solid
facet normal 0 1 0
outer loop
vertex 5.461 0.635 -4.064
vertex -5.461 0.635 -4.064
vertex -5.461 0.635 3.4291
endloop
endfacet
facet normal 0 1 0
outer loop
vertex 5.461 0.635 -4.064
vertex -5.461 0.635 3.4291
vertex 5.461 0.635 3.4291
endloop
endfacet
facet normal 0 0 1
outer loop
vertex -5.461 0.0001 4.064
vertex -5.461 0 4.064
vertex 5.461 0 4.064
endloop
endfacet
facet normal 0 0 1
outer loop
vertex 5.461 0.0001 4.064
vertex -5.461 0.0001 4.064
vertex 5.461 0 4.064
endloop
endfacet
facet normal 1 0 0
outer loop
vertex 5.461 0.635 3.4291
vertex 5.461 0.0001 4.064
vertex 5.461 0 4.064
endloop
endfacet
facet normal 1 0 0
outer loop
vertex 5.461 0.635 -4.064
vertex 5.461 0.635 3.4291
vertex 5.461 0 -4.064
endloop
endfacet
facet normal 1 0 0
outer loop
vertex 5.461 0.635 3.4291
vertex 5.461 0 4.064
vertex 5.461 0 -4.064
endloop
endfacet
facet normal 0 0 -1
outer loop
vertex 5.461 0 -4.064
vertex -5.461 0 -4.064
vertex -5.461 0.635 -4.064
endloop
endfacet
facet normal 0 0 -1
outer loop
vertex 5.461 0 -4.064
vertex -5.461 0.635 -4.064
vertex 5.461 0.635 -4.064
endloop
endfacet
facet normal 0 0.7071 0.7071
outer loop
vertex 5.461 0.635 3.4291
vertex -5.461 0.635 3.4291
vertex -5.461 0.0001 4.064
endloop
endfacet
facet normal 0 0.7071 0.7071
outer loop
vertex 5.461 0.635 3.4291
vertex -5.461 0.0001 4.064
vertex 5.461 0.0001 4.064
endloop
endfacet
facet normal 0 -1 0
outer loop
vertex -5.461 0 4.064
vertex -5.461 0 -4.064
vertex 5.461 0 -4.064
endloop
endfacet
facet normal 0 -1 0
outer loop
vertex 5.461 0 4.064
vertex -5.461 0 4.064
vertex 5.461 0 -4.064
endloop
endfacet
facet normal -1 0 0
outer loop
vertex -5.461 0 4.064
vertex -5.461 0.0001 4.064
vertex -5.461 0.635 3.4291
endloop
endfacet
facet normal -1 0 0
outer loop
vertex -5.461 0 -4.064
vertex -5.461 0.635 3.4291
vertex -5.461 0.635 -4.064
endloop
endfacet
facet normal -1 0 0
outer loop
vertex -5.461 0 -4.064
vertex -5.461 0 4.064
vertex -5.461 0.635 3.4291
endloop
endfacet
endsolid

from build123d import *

# Parameters (mm, degrees)
SKETCH1_W           = 10.922
SKETCH1_H           = 8.128
BOSS_EXTRUDE1_DEPTH = 0.635
CHAMFER1_SIZE       = 0.635


with BuildPart() as part:
    # Sketch1 → Boss-Extrude1 (new body)
    with BuildSketch(Plane(origin=(0, 0, 0), x_dir=(1, 0, 0), z_dir=(0, 1, 0))):
        Rectangle(SKETCH1_W, SKETCH1_H)
    extrude(amount=BOSS_EXTRUDE1_DEPTH)

    # Chamfer1
    chamfer1_edges = [part.edges().sort_by_distance(p)[0] for p in [
        (0, 0.635, 4.064),
    ]]
    chamfer(chamfer1_edges, length=CHAMFER1_SIZE - 0.0001)  # a hair under: the kernel refuses the full size


solid = part.part
